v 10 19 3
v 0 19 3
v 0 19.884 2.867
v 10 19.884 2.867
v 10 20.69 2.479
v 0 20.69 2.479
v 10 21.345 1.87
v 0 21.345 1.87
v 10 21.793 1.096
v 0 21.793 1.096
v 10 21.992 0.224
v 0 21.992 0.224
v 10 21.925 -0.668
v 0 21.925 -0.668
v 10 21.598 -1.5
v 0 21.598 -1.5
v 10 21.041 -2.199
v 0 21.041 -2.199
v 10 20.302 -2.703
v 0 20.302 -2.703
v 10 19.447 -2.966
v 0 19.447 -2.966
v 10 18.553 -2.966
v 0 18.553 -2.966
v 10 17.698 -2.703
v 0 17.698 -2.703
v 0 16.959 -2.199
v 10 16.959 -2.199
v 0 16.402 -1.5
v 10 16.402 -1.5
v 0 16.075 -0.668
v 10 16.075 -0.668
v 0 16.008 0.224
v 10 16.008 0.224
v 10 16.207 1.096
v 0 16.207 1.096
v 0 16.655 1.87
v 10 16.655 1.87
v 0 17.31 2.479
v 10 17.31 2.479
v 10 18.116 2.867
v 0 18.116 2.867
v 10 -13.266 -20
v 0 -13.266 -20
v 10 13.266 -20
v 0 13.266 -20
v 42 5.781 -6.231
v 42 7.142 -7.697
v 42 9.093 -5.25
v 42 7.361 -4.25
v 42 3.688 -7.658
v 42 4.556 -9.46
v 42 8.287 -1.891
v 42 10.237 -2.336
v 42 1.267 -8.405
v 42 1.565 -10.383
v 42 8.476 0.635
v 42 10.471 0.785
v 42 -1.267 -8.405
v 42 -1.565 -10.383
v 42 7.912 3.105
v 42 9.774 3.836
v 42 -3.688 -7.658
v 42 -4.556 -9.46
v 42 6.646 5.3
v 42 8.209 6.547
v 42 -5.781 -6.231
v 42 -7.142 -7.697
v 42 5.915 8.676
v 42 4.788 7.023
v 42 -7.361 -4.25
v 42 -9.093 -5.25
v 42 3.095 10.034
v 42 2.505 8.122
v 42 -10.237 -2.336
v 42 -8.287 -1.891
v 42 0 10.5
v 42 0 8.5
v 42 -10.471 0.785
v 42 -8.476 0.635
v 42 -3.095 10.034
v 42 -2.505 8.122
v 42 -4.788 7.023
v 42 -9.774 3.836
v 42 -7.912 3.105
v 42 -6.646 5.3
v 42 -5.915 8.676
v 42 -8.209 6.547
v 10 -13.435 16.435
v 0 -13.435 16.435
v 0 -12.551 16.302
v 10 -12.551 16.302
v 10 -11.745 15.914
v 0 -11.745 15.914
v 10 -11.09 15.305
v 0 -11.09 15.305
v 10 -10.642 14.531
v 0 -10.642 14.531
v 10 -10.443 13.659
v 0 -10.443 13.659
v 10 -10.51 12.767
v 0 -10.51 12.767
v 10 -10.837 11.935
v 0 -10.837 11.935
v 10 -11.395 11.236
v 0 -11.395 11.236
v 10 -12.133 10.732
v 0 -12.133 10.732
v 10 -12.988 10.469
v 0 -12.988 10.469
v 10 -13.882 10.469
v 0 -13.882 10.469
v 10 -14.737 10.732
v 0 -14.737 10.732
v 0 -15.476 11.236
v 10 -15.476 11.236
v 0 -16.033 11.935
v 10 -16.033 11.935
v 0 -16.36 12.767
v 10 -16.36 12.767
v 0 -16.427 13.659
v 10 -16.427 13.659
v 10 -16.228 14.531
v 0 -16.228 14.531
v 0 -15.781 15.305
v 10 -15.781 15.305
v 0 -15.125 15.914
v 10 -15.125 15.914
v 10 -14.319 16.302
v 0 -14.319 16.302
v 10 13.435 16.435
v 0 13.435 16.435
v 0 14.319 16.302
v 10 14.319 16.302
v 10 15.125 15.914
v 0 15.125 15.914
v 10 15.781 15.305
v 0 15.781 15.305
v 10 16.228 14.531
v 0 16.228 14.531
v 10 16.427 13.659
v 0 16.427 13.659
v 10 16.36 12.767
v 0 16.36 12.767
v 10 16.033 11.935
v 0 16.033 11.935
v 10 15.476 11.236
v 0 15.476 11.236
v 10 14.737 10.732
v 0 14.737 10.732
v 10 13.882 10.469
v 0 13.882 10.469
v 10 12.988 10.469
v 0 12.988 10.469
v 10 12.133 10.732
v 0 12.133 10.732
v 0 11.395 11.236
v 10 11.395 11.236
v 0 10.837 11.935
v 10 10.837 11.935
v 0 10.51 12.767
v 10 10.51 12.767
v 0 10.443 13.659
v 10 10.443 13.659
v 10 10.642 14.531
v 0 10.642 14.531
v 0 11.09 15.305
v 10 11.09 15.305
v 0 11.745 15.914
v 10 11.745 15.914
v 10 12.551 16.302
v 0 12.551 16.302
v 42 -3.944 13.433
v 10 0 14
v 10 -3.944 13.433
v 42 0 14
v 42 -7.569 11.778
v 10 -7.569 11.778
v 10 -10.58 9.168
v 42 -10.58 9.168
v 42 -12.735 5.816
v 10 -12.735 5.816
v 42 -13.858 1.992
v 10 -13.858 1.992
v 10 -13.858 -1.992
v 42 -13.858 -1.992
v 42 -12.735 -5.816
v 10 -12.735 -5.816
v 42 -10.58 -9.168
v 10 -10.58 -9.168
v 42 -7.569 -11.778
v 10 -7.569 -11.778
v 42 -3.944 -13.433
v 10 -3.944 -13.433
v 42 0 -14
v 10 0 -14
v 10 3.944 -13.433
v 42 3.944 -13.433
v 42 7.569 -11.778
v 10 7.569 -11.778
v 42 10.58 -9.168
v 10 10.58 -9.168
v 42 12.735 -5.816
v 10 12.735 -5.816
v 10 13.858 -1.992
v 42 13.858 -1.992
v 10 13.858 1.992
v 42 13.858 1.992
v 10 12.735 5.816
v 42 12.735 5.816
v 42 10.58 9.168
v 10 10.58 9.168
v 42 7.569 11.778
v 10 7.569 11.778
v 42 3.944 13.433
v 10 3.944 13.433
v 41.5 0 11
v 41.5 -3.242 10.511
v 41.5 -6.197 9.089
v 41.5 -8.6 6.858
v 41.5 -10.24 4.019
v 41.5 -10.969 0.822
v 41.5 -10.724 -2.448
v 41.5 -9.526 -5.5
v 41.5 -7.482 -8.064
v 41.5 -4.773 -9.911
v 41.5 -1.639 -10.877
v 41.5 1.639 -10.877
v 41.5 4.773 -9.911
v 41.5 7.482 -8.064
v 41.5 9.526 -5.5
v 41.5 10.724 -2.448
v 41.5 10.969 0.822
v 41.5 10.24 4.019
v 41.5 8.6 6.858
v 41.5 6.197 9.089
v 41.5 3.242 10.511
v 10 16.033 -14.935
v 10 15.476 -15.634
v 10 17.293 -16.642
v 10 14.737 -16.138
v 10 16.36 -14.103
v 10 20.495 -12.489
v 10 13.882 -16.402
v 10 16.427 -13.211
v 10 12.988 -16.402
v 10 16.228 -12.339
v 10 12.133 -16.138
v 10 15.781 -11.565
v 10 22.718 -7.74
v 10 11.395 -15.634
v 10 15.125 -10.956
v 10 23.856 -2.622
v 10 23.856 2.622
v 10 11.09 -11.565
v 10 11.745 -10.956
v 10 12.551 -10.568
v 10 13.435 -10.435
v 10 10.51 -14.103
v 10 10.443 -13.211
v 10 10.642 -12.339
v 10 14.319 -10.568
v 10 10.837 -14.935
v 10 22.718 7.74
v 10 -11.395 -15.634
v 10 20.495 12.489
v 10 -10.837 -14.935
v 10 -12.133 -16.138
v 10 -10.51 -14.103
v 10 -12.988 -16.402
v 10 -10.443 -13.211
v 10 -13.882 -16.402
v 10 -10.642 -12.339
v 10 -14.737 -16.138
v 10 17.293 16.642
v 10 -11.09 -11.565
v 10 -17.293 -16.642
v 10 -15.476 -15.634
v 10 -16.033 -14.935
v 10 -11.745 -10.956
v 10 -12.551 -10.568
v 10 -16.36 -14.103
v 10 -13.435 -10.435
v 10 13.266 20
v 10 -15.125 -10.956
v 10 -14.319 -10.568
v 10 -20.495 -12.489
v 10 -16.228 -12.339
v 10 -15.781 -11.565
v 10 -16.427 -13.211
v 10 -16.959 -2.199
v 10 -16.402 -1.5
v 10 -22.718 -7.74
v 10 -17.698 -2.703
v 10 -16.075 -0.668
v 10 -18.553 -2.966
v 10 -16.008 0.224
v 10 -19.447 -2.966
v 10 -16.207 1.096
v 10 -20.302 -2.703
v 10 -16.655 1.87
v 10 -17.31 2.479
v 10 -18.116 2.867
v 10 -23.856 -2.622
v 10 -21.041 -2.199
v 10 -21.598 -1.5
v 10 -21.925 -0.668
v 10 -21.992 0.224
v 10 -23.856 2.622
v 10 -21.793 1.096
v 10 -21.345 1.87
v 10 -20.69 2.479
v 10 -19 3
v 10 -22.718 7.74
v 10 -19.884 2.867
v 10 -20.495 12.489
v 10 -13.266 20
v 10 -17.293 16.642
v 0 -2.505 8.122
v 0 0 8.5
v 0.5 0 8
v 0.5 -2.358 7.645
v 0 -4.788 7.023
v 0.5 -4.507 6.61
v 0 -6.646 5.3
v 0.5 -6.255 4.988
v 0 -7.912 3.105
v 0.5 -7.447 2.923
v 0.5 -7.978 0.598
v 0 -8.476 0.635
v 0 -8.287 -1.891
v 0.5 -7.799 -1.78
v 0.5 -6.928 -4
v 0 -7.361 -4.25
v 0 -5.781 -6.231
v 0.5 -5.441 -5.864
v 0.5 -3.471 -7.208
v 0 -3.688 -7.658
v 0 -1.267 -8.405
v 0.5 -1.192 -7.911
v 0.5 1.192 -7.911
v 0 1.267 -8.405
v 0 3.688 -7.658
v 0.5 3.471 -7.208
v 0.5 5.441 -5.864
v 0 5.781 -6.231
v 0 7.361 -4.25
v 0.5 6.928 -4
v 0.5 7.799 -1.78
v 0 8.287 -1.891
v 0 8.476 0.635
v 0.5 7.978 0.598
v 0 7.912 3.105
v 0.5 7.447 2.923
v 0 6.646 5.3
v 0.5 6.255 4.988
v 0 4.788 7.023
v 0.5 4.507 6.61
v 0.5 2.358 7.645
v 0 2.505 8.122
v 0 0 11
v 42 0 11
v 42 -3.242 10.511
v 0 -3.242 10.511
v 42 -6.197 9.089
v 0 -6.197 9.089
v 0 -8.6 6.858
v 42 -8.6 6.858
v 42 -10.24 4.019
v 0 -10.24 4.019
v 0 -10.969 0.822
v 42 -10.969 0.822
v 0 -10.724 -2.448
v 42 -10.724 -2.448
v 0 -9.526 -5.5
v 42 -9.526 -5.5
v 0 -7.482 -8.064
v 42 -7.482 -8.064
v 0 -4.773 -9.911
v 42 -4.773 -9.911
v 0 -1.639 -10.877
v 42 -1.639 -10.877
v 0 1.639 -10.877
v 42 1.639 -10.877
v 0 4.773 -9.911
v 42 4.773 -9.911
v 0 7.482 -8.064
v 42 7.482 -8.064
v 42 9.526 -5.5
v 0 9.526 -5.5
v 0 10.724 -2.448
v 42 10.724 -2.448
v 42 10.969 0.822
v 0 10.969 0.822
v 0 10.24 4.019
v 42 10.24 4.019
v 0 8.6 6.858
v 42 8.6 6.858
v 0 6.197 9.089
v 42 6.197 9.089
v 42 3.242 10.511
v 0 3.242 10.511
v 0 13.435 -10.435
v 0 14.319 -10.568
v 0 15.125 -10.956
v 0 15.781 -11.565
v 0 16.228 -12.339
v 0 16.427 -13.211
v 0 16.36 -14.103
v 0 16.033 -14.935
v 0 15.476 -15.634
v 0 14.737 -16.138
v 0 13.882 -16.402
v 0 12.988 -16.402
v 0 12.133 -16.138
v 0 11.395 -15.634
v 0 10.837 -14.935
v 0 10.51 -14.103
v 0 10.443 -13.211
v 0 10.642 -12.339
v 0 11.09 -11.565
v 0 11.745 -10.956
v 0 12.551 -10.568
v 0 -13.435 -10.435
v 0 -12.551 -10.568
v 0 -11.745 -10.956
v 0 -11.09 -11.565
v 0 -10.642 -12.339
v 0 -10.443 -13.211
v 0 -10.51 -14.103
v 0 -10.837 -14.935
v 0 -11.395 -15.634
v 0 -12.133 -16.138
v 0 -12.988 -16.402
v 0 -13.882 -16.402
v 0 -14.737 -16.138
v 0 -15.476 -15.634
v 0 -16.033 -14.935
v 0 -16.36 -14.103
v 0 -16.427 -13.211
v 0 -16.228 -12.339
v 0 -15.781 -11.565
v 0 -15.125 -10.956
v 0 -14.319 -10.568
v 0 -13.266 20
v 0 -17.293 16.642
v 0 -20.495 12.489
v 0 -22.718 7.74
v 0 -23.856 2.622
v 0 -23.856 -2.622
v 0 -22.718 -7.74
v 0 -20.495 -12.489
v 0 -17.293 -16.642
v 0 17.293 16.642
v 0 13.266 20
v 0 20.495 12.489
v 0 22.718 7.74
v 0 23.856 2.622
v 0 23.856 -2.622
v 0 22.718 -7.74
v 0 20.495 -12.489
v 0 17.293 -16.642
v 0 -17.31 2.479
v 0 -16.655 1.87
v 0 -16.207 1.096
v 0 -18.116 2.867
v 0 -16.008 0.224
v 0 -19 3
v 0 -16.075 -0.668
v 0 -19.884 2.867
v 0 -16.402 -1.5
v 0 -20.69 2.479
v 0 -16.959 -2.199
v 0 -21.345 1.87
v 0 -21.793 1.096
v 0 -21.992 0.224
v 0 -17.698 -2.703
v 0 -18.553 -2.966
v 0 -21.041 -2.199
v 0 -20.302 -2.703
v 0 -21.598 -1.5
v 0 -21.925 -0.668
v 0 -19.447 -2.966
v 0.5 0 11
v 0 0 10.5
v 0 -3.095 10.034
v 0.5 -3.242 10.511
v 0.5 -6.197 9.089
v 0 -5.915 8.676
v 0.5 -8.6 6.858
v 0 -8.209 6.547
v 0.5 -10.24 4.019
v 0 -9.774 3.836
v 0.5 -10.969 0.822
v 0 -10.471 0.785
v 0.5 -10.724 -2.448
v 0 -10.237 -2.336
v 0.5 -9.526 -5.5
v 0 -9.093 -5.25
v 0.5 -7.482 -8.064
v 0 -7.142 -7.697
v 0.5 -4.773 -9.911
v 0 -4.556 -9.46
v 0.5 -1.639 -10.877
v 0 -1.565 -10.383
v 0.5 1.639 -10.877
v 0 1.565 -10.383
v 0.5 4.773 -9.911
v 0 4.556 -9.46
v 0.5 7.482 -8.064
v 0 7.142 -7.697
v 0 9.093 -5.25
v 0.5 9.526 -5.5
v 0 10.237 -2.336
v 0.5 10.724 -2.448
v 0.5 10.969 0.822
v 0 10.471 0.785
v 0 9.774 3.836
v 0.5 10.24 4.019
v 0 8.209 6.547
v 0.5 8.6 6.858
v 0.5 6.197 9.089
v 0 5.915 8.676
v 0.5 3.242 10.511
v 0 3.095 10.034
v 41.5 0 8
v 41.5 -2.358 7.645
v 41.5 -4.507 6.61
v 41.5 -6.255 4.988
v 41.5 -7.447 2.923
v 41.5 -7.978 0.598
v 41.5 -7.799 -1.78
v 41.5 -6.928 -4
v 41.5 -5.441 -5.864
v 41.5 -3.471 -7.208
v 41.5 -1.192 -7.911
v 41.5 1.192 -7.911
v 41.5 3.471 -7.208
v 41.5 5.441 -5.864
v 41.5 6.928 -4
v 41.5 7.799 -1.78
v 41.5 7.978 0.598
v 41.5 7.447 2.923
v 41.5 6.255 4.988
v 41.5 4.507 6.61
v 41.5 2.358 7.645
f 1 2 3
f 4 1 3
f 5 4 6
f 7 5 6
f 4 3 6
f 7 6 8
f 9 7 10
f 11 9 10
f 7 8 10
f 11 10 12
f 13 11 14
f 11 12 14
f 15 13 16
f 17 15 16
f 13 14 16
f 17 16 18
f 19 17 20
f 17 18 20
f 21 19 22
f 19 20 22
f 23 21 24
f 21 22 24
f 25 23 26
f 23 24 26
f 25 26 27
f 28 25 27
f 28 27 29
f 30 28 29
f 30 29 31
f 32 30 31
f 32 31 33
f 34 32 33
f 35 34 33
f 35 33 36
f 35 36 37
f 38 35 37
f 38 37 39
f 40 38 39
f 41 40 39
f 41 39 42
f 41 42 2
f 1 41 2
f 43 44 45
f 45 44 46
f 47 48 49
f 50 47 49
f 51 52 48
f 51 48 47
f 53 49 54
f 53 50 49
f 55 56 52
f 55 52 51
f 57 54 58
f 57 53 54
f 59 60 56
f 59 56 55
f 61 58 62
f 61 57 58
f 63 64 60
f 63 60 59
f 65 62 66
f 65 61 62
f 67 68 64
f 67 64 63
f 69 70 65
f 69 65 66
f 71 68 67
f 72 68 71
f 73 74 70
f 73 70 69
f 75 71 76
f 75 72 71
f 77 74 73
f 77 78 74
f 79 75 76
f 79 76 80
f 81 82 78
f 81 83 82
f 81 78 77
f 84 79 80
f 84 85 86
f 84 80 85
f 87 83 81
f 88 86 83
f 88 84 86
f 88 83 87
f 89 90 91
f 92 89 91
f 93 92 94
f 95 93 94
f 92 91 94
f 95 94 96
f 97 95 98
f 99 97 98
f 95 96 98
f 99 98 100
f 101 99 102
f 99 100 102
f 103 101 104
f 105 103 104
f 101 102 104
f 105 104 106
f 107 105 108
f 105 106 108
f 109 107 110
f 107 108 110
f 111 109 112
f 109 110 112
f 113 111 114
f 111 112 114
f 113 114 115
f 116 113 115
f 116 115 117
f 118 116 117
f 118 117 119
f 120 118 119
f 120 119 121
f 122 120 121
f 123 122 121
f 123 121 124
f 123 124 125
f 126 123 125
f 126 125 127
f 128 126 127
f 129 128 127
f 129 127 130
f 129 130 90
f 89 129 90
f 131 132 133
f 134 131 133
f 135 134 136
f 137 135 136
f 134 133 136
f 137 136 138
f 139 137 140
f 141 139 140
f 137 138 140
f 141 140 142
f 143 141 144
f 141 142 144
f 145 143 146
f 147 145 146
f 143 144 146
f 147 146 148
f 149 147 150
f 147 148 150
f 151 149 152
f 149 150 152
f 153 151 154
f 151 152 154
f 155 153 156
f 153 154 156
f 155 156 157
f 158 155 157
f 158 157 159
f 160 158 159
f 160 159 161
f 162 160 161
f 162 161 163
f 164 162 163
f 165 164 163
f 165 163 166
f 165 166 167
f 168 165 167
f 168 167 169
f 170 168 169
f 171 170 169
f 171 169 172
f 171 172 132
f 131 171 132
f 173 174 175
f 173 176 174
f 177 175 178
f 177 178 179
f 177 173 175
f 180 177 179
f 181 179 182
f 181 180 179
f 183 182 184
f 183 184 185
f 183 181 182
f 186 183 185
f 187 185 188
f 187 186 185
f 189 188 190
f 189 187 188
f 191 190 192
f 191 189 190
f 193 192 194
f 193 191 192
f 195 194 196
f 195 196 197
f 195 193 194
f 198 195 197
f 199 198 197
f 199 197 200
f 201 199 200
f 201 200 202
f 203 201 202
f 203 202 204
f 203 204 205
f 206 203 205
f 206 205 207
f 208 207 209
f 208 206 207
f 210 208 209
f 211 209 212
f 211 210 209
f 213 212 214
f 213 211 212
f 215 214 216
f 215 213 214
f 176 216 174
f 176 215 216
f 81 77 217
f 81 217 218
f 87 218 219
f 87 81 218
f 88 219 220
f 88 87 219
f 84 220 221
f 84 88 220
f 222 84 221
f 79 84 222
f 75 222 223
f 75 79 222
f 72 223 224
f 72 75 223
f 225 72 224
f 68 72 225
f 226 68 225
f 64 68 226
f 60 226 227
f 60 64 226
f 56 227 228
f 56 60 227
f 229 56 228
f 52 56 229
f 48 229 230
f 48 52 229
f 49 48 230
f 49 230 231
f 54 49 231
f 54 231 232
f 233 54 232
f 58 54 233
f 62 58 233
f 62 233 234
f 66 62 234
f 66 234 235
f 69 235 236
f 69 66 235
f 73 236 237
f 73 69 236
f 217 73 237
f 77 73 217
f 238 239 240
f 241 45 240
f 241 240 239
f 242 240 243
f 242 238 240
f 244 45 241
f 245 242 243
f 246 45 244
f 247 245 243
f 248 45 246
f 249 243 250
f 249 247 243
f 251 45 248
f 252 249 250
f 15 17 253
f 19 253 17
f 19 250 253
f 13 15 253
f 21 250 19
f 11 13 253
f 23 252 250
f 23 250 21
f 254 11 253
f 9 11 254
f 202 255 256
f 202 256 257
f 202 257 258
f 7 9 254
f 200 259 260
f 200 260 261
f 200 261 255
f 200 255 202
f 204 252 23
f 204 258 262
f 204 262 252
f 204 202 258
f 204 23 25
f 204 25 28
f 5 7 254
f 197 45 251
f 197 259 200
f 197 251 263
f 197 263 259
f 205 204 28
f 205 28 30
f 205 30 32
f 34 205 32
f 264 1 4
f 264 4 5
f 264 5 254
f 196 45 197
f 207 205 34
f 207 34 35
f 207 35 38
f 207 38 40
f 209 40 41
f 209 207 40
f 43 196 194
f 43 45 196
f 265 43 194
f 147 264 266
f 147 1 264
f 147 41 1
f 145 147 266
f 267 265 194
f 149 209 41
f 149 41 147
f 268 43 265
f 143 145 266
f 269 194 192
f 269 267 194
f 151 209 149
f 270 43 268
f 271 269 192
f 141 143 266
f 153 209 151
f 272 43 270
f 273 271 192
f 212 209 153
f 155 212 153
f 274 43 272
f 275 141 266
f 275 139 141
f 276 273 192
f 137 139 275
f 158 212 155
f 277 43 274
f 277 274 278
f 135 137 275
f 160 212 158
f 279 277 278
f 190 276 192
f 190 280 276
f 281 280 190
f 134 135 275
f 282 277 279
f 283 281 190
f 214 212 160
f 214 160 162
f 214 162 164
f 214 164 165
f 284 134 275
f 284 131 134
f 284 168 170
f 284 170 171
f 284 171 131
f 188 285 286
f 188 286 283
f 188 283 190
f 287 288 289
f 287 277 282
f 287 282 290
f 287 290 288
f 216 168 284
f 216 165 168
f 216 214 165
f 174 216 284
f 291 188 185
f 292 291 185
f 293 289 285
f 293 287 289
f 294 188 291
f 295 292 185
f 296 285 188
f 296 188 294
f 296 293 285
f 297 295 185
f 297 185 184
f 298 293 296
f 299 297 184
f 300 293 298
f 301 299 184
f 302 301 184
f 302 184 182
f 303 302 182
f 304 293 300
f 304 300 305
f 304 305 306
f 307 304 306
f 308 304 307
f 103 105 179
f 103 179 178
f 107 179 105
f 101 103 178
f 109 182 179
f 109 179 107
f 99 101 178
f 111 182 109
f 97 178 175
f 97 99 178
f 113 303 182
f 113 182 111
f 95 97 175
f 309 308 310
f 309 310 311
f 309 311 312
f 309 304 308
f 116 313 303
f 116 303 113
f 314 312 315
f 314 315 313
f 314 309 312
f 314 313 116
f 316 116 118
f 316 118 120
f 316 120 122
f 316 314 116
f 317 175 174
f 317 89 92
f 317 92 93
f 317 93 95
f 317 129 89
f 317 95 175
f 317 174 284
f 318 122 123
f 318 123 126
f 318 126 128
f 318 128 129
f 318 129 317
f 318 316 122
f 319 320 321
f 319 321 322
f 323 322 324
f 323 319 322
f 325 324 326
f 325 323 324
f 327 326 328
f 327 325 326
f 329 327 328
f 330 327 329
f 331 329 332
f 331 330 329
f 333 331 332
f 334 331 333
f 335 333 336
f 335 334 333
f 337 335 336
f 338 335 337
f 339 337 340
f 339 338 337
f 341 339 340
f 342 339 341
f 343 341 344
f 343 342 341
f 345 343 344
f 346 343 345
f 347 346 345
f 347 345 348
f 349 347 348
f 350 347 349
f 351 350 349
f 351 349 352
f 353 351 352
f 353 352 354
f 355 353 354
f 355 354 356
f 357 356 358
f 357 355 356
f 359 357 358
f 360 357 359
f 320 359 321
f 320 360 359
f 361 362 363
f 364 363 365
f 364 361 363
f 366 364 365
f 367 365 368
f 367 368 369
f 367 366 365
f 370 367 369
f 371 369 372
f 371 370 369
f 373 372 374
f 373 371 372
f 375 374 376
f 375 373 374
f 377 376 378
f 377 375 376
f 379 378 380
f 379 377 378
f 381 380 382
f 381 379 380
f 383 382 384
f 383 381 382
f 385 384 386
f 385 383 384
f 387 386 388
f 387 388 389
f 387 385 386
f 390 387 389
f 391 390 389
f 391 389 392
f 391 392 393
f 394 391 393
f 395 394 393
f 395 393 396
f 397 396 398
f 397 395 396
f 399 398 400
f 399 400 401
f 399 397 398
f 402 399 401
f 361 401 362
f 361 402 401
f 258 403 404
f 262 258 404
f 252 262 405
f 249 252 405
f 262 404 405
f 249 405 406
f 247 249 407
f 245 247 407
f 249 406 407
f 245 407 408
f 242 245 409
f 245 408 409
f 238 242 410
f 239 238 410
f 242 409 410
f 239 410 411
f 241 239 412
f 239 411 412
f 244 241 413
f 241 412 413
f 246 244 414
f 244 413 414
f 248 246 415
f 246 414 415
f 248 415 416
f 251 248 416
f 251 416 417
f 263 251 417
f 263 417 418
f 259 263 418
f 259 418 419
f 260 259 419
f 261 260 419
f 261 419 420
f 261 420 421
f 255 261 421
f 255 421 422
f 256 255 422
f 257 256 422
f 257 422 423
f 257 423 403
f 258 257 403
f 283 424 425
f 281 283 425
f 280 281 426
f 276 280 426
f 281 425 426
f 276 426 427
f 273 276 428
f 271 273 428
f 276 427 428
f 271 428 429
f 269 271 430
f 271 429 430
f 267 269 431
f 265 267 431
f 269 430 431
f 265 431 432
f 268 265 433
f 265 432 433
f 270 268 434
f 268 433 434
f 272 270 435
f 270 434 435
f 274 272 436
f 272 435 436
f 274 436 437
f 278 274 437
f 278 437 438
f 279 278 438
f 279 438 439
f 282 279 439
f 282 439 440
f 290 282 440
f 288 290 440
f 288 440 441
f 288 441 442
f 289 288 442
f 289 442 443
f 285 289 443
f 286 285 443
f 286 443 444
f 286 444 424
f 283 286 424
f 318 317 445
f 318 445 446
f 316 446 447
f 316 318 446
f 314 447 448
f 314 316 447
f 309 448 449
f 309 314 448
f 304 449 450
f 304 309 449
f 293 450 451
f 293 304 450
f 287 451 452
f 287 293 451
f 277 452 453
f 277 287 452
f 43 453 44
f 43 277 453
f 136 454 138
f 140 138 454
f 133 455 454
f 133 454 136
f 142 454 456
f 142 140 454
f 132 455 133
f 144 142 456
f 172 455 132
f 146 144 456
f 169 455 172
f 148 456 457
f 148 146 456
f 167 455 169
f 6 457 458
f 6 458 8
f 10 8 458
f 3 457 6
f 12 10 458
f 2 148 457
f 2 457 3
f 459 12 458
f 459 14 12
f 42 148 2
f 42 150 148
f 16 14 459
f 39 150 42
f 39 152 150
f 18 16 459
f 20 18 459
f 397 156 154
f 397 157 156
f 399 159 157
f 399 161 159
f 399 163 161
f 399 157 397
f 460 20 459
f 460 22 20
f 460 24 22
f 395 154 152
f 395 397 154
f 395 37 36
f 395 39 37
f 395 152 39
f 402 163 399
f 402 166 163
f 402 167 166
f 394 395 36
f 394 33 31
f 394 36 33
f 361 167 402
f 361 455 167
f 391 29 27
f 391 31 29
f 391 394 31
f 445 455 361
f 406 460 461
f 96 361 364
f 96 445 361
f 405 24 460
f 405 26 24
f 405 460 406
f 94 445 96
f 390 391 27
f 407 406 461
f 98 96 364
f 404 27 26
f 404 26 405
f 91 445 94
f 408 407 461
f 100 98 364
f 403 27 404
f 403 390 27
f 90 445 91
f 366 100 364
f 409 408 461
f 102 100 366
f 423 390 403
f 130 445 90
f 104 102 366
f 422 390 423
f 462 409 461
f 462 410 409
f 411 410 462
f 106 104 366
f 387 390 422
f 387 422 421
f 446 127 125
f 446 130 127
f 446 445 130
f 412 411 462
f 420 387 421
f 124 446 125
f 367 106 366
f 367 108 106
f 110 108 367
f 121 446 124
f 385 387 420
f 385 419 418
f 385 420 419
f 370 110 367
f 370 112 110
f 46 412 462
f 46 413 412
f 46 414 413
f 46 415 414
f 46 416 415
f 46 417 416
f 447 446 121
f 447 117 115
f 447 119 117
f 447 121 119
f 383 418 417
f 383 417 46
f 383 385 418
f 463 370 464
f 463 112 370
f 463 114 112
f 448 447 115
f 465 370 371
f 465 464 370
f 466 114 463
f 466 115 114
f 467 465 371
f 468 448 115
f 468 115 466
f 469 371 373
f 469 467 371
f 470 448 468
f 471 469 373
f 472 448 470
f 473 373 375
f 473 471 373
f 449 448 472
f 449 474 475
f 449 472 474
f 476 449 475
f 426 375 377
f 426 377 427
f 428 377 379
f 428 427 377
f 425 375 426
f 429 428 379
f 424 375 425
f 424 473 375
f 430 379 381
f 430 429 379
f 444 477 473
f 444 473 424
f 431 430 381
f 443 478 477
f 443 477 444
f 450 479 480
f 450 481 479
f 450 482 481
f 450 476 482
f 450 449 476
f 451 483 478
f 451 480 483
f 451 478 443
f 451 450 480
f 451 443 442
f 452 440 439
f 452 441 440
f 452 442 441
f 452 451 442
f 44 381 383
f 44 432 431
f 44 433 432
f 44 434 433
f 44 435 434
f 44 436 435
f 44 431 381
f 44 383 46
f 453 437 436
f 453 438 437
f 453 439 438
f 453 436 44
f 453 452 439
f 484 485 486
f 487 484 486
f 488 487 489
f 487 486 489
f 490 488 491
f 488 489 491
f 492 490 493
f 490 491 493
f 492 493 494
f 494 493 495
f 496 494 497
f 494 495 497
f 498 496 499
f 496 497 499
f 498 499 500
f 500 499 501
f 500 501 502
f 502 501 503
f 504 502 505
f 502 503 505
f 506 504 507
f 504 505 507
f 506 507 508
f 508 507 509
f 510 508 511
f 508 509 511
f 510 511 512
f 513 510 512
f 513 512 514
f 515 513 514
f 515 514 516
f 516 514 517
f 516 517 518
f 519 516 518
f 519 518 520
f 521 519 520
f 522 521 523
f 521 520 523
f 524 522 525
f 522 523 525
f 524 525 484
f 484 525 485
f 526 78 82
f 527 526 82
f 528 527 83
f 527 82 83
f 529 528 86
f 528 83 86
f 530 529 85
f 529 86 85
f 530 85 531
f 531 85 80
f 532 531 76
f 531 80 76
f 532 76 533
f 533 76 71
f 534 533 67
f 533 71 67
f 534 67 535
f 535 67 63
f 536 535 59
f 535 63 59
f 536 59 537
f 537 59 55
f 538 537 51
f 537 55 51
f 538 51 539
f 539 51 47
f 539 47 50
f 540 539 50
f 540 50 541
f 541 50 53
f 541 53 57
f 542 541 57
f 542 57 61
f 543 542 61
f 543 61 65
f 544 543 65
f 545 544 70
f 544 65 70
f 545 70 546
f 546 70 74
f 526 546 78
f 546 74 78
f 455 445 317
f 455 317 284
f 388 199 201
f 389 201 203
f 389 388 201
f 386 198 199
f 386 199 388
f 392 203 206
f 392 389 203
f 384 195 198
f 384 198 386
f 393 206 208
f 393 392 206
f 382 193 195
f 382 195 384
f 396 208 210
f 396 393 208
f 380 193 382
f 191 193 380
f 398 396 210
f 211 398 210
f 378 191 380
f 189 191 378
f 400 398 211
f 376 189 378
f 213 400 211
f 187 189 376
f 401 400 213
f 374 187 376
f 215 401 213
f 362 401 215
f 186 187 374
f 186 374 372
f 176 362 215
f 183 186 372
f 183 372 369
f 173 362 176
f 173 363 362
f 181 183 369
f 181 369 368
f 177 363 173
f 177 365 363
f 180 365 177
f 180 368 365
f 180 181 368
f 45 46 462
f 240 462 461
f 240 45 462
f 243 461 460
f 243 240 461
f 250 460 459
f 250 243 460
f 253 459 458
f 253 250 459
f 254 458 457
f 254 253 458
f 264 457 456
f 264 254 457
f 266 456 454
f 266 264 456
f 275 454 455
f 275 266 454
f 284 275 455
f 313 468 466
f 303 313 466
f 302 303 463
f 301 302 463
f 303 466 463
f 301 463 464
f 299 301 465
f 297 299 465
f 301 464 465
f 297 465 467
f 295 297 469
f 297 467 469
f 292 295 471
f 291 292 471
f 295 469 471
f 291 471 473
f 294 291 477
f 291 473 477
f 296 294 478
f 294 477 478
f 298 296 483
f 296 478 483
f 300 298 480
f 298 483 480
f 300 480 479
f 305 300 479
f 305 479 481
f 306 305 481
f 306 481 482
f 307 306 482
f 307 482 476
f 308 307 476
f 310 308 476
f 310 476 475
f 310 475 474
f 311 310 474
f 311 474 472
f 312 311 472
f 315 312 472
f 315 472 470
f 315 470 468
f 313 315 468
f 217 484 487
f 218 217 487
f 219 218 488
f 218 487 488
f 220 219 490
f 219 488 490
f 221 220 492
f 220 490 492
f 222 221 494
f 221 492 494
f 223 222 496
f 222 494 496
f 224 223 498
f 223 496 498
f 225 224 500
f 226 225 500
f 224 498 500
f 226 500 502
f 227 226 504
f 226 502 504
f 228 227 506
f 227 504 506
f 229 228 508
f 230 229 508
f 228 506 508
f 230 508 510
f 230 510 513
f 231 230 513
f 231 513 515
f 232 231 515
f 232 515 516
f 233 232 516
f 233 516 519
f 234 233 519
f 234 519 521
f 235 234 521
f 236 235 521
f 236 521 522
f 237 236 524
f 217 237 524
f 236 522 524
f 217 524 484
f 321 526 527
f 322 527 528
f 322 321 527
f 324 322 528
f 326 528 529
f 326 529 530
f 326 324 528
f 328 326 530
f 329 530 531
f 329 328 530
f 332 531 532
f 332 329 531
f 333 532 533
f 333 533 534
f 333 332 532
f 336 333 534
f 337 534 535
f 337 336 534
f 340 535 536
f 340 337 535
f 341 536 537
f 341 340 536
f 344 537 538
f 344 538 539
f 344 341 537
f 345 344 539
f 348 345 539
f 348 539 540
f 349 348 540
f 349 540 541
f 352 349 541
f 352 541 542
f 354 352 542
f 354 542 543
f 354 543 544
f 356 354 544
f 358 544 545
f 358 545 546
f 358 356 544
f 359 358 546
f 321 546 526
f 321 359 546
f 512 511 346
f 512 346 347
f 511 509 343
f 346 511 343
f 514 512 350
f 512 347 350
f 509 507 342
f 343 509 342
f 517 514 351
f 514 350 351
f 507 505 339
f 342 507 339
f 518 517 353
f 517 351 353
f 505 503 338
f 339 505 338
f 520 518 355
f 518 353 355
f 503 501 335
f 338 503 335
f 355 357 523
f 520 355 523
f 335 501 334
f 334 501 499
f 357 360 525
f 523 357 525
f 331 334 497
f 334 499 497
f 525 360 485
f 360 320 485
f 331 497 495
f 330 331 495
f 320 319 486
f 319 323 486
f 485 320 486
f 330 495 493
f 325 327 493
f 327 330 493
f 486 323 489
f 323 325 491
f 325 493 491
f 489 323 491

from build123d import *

# Parameters (mm, degrees)
SKETCH_2_W          = 60
SKETCH_2_H          = 68
SKETCH_2_W_2        = 40
SKETCH_2_H_2        = 48
CUT_EXTRUDE_1_DEPTH = 55
SKETCH_3_R          = 3
CUT_EXTRUDE_2_DEPTH = 53.345009313
SKETCH_4_R          = 11
SKETCH_4_R_2        = 8
EXTRUDE_1_DEPTH     = 42
CHAMFER_1_SIZE      = 0.5


with BuildPart() as part:
    # Эскиз1 → Повернуть1 (revolve)
    with BuildSketch(Plane.XY, mode=Mode.PRIVATE) as revolve_1_sk:
        Polygon((0, 11), (0, 24), (10, 24), (10, 14), (42, 14), (42, 11), align=None)
    revolve(revolve_1_sk.sketch.rotate(Axis((0, 0, 0), (1, 0, 0)), 90), axis=Axis((0, 0, 0), (1, 0, 0)))

    # Эскиз2 → Вырез-Вытянуть1 (cut, through all)
    with BuildSketch(Plane.ZY):
        Rectangle(SKETCH_2_W, SKETCH_2_H)
        Rectangle(SKETCH_2_W_2, SKETCH_2_H_2, mode=Mode.SUBTRACT)
    extrude(amount=-CUT_EXTRUDE_1_DEPTH, mode=Mode.SUBTRACT)

    # Эскиз3 → Вырез-Вытянуть2 (cut, through all)
    with BuildSketch(Plane.ZY):
        with Locations((0, 19)):
            Circle(SKETCH_3_R)
        with Locations((13.435028843, 13.435028843)):
            Circle(SKETCH_3_R)
        with Locations((-13.435028843, 13.435028843)):
            Circle(SKETCH_3_R)
        with Locations((-13.435028843, -13.435028843)):
            Circle(SKETCH_3_R)
        with Locations((0, -19)):
            Circle(SKETCH_3_R)
        with Locations((13.435028843, -13.435028843)):
            Circle(SKETCH_3_R)
    extrude(amount=-CUT_EXTRUDE_2_DEPTH, mode=Mode.SUBTRACT)


with BuildPart() as body_2:
    # Эскиз4 → Бобышка-Вытянуть1 (new body)
    with BuildSketch(Plane(origin=(0, 0, 0), x_dir=(0, 0, -1), z_dir=(1, 0, 0))):
        with Locations(Location((0, 0, 0), (0, 0, 180))):
            Circle(SKETCH_4_R)
        with Locations(Location((0, 0, 0), (0, 0, 180))):
            Circle(SKETCH_4_R_2, mode=Mode.SUBTRACT)
    extrude(amount=EXTRUDE_1_DEPTH)

    # Фаска1
    chamfer_1_edges = [body_2.edges().sort_by_distance(p)[0] for p in [
        (0, 0, -8),
        (0, 0, -11),
        (42, 0, -11),
        (42, 0, -8),
    ]]
    chamfer(chamfer_1_edges, length=CHAMFER_1_SIZE)


solid = Compound([part.part, body_2.part])
